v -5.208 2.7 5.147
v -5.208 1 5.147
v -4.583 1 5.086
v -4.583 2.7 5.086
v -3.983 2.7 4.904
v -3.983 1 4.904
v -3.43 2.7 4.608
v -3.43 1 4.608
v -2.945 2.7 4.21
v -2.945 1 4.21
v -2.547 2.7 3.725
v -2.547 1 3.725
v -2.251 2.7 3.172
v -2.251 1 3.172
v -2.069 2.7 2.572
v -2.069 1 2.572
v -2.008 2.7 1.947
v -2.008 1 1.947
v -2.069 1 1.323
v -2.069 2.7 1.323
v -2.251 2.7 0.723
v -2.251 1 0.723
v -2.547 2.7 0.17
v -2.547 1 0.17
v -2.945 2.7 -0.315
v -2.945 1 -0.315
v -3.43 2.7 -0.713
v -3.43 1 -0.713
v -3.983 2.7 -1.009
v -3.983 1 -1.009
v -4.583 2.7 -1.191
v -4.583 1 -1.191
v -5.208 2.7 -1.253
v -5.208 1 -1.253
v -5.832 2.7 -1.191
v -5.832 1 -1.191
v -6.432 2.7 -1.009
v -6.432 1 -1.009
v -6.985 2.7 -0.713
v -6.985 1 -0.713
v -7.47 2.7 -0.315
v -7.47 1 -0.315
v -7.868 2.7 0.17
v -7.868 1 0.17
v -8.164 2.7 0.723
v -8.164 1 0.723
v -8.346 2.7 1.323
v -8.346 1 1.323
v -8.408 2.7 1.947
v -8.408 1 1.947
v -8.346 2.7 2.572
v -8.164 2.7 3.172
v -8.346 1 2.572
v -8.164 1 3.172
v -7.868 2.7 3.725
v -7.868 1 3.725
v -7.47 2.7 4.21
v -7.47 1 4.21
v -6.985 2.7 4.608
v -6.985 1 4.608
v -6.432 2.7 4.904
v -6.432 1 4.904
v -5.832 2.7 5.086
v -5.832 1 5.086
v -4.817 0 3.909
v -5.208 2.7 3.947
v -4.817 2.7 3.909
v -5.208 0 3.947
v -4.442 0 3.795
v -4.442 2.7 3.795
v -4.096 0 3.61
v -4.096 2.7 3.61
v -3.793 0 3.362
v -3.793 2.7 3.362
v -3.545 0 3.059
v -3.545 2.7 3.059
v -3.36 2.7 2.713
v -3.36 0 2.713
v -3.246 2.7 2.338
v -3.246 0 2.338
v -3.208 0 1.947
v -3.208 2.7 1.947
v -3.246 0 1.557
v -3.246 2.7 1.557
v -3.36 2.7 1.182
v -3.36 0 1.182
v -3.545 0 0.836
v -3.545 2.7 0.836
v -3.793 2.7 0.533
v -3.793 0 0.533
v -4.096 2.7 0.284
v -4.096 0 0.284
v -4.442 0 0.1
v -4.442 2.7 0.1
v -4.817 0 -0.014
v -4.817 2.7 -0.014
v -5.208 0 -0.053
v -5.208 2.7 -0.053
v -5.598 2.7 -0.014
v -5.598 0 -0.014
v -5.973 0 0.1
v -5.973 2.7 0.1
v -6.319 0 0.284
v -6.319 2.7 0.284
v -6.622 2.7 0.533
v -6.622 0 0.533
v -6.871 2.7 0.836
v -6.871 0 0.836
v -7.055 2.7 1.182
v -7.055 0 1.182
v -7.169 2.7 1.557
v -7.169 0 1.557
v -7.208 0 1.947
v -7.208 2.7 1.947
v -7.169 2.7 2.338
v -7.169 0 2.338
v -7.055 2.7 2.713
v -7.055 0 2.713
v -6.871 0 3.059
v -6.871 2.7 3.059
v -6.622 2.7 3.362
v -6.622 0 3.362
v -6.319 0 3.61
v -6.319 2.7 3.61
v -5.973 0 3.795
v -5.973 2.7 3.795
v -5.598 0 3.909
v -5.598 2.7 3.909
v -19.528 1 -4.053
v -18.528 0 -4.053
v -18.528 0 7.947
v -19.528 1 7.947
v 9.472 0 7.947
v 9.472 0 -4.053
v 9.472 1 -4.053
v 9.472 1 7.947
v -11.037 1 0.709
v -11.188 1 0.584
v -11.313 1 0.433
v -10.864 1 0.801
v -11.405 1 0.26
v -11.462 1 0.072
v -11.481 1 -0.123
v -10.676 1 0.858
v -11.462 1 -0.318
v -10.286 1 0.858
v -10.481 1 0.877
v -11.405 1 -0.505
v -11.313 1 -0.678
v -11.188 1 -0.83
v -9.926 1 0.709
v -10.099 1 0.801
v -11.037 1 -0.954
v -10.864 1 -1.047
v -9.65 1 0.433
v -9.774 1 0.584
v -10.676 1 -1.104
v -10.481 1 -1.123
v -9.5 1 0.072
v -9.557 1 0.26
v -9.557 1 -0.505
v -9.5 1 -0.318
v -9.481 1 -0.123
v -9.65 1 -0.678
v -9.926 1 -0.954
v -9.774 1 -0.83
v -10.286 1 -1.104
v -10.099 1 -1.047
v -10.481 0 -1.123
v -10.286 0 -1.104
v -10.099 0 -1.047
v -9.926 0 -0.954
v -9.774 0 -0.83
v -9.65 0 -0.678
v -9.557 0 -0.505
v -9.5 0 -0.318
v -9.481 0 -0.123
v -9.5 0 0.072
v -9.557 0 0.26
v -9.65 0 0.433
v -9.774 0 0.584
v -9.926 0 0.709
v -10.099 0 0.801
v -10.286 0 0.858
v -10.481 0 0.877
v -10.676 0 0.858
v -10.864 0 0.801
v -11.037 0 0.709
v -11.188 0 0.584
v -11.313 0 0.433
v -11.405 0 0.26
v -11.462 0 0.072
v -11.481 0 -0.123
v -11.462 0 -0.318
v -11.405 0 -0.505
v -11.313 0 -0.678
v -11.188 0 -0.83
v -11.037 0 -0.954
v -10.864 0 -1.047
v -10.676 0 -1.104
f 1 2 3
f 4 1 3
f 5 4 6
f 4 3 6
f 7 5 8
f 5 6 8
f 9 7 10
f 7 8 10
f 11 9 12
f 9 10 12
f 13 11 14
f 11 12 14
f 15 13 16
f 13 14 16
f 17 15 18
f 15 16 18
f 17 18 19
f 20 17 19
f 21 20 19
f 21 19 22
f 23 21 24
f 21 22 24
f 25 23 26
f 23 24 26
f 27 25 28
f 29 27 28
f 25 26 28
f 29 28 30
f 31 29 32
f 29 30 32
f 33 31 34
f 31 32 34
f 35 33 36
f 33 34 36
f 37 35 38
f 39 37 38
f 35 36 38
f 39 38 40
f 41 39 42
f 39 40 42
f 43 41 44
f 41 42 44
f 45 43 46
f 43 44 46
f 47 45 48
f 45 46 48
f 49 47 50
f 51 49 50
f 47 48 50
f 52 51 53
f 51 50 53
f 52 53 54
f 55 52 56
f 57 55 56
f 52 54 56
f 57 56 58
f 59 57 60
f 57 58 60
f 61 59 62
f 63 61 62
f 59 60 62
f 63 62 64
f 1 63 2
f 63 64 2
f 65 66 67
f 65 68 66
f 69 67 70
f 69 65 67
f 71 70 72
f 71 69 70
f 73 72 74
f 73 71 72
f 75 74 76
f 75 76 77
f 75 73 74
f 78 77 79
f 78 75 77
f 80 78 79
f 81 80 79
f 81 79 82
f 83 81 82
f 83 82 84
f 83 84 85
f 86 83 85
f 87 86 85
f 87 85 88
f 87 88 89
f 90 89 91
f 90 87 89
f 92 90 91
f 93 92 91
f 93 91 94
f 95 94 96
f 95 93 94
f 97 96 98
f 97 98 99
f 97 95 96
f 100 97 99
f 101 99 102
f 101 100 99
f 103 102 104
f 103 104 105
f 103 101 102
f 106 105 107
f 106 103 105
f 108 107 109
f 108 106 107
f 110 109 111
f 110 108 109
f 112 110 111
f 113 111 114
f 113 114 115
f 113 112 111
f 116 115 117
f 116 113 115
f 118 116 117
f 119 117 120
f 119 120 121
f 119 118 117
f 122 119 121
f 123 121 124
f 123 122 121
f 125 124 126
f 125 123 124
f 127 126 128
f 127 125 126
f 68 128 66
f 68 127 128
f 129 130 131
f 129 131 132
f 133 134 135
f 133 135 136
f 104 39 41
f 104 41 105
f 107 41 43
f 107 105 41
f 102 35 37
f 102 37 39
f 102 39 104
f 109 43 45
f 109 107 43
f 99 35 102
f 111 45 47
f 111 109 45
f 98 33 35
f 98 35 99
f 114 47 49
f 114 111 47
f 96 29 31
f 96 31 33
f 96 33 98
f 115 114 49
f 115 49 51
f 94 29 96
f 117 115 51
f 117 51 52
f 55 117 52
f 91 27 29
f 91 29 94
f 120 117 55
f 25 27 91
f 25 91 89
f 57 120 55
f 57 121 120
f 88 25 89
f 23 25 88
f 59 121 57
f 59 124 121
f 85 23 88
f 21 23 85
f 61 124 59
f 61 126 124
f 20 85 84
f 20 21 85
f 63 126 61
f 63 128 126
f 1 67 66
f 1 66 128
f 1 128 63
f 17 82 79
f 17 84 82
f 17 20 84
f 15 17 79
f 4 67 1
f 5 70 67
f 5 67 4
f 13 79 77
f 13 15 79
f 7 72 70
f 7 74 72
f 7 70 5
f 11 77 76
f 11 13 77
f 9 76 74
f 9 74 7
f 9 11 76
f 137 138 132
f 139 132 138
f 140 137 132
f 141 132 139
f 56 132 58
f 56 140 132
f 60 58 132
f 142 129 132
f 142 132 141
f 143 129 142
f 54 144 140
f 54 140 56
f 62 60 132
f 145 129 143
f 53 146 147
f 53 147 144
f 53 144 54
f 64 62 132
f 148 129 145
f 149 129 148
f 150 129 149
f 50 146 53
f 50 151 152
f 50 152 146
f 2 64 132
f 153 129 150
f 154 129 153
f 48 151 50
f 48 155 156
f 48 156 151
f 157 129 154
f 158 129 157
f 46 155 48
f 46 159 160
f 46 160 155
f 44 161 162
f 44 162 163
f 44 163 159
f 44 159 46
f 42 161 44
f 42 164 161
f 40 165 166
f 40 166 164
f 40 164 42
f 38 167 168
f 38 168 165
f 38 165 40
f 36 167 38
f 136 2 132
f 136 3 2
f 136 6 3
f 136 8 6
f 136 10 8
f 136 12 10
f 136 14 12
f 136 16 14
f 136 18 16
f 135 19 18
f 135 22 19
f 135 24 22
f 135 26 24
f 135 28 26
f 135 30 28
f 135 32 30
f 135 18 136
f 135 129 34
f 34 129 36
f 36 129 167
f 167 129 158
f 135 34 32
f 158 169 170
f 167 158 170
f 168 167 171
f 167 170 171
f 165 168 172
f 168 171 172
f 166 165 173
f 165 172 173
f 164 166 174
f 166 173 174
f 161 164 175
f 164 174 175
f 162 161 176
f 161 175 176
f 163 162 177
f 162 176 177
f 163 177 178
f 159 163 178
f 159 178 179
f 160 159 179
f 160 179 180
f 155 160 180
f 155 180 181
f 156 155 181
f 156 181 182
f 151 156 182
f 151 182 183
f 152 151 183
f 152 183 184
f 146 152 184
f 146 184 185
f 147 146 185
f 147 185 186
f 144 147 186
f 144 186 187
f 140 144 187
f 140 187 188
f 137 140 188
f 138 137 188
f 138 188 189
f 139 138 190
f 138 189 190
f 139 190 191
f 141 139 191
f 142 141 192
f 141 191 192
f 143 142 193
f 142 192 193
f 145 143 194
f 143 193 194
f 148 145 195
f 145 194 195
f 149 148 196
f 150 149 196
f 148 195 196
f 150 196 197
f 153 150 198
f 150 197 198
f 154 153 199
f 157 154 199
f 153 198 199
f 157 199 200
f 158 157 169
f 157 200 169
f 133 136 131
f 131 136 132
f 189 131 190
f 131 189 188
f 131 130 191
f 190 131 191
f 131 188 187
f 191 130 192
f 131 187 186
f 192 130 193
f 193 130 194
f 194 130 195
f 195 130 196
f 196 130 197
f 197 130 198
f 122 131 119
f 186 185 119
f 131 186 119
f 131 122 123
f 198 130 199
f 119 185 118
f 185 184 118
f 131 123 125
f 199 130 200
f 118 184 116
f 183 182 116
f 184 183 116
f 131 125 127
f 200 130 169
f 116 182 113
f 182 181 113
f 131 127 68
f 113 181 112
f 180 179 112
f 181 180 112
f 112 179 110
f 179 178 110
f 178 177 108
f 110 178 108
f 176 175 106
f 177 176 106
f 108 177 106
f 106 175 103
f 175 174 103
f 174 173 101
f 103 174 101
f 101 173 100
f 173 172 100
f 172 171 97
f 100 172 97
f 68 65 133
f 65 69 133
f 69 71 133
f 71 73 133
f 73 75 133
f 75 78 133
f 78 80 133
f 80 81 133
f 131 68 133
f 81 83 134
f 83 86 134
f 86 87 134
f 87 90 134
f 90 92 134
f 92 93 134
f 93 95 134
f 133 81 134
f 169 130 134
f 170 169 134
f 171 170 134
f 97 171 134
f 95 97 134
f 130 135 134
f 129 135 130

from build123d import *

# Parameters (mm, degrees)
SKETCH_2_W          = 30
SKETCH_2_H          = 12
SKETCH_2_R          = 2
EXTRUDE_1_DEPTH     = 1
SKETCH_3_R          = 3.2
SKETCH_3_R_2        = 2
EXTRUDE_2_DEPTH     = 1.7
SKETCH_4_R          = 1
CUT_EXTRUDE_1_DEPTH = 5
EXTRUDE_3_DEPTH     = 12
SKETCH_6_W          = 2
SKETCH_6_H          = 12
CUT_EXTRUDE_2_DEPTH = 1


with BuildPart() as part:
    # 草图2 → 凸台-拉伸1 (new body)
    with BuildSketch(Plane(origin=(0, 0, 0), x_dir=(1, 0, 0), z_dir=(0, 1, 0))):
        with Locations((-3.527606217, -1.94741871)):
            Rectangle(SKETCH_2_W, SKETCH_2_H)
        with Locations(Location((-5.207606217, -1.94741871, 0), (0, 0, 270))):
            Circle(SKETCH_2_R, mode=Mode.SUBTRACT)
    extrude(amount=EXTRUDE_1_DEPTH)

    # 草图3 → 凸台-拉伸2 (add)
    with BuildSketch(Plane(origin=(0, 1, 0), x_dir=(1, 0, 0), z_dir=(0, 1, 0))):
        with Locations(Location((-5.207606217, -1.94741871, 0), (0, 0, 270))):
            Circle(SKETCH_3_R)
        with Locations(Location((-5.207606217, -1.94741871, 0), (0, 0, 270))):
            Circle(SKETCH_3_R_2, mode=Mode.SUBTRACT)
    extrude(amount=EXTRUDE_2_DEPTH)

    # 草图4 → 切除-拉伸1 (cut)
    with BuildSketch(Plane.XZ):
        with Locations(Location((-10.481209657, -0.12271673, 0), (0, 0, 270))):
            Circle(SKETCH_4_R)
    extrude(amount=-CUT_EXTRUDE_1_DEPTH, mode=Mode.SUBTRACT)

    # 草图5 → 凸台-拉伸3 (add)
    with BuildSketch(Plane(origin=(0, 0, -4.05258129), x_dir=(-1, 0, 0), z_dir=(0, 0, -1))):
        Polygon((18.527606217, 1), (18.527606217, 0), (19.527606217, 1), align=None)
    extrude(amount=-EXTRUDE_3_DEPTH)

    # 草图6 → 切除-拉伸2 (cut)
    with BuildSketch(Plane.XZ):
        with Locations((10.472393783, 1.94741871)):
            Rectangle(SKETCH_6_W, SKETCH_6_H)
    extrude(amount=-CUT_EXTRUDE_2_DEPTH, mode=Mode.SUBTRACT)


solid = part.part
